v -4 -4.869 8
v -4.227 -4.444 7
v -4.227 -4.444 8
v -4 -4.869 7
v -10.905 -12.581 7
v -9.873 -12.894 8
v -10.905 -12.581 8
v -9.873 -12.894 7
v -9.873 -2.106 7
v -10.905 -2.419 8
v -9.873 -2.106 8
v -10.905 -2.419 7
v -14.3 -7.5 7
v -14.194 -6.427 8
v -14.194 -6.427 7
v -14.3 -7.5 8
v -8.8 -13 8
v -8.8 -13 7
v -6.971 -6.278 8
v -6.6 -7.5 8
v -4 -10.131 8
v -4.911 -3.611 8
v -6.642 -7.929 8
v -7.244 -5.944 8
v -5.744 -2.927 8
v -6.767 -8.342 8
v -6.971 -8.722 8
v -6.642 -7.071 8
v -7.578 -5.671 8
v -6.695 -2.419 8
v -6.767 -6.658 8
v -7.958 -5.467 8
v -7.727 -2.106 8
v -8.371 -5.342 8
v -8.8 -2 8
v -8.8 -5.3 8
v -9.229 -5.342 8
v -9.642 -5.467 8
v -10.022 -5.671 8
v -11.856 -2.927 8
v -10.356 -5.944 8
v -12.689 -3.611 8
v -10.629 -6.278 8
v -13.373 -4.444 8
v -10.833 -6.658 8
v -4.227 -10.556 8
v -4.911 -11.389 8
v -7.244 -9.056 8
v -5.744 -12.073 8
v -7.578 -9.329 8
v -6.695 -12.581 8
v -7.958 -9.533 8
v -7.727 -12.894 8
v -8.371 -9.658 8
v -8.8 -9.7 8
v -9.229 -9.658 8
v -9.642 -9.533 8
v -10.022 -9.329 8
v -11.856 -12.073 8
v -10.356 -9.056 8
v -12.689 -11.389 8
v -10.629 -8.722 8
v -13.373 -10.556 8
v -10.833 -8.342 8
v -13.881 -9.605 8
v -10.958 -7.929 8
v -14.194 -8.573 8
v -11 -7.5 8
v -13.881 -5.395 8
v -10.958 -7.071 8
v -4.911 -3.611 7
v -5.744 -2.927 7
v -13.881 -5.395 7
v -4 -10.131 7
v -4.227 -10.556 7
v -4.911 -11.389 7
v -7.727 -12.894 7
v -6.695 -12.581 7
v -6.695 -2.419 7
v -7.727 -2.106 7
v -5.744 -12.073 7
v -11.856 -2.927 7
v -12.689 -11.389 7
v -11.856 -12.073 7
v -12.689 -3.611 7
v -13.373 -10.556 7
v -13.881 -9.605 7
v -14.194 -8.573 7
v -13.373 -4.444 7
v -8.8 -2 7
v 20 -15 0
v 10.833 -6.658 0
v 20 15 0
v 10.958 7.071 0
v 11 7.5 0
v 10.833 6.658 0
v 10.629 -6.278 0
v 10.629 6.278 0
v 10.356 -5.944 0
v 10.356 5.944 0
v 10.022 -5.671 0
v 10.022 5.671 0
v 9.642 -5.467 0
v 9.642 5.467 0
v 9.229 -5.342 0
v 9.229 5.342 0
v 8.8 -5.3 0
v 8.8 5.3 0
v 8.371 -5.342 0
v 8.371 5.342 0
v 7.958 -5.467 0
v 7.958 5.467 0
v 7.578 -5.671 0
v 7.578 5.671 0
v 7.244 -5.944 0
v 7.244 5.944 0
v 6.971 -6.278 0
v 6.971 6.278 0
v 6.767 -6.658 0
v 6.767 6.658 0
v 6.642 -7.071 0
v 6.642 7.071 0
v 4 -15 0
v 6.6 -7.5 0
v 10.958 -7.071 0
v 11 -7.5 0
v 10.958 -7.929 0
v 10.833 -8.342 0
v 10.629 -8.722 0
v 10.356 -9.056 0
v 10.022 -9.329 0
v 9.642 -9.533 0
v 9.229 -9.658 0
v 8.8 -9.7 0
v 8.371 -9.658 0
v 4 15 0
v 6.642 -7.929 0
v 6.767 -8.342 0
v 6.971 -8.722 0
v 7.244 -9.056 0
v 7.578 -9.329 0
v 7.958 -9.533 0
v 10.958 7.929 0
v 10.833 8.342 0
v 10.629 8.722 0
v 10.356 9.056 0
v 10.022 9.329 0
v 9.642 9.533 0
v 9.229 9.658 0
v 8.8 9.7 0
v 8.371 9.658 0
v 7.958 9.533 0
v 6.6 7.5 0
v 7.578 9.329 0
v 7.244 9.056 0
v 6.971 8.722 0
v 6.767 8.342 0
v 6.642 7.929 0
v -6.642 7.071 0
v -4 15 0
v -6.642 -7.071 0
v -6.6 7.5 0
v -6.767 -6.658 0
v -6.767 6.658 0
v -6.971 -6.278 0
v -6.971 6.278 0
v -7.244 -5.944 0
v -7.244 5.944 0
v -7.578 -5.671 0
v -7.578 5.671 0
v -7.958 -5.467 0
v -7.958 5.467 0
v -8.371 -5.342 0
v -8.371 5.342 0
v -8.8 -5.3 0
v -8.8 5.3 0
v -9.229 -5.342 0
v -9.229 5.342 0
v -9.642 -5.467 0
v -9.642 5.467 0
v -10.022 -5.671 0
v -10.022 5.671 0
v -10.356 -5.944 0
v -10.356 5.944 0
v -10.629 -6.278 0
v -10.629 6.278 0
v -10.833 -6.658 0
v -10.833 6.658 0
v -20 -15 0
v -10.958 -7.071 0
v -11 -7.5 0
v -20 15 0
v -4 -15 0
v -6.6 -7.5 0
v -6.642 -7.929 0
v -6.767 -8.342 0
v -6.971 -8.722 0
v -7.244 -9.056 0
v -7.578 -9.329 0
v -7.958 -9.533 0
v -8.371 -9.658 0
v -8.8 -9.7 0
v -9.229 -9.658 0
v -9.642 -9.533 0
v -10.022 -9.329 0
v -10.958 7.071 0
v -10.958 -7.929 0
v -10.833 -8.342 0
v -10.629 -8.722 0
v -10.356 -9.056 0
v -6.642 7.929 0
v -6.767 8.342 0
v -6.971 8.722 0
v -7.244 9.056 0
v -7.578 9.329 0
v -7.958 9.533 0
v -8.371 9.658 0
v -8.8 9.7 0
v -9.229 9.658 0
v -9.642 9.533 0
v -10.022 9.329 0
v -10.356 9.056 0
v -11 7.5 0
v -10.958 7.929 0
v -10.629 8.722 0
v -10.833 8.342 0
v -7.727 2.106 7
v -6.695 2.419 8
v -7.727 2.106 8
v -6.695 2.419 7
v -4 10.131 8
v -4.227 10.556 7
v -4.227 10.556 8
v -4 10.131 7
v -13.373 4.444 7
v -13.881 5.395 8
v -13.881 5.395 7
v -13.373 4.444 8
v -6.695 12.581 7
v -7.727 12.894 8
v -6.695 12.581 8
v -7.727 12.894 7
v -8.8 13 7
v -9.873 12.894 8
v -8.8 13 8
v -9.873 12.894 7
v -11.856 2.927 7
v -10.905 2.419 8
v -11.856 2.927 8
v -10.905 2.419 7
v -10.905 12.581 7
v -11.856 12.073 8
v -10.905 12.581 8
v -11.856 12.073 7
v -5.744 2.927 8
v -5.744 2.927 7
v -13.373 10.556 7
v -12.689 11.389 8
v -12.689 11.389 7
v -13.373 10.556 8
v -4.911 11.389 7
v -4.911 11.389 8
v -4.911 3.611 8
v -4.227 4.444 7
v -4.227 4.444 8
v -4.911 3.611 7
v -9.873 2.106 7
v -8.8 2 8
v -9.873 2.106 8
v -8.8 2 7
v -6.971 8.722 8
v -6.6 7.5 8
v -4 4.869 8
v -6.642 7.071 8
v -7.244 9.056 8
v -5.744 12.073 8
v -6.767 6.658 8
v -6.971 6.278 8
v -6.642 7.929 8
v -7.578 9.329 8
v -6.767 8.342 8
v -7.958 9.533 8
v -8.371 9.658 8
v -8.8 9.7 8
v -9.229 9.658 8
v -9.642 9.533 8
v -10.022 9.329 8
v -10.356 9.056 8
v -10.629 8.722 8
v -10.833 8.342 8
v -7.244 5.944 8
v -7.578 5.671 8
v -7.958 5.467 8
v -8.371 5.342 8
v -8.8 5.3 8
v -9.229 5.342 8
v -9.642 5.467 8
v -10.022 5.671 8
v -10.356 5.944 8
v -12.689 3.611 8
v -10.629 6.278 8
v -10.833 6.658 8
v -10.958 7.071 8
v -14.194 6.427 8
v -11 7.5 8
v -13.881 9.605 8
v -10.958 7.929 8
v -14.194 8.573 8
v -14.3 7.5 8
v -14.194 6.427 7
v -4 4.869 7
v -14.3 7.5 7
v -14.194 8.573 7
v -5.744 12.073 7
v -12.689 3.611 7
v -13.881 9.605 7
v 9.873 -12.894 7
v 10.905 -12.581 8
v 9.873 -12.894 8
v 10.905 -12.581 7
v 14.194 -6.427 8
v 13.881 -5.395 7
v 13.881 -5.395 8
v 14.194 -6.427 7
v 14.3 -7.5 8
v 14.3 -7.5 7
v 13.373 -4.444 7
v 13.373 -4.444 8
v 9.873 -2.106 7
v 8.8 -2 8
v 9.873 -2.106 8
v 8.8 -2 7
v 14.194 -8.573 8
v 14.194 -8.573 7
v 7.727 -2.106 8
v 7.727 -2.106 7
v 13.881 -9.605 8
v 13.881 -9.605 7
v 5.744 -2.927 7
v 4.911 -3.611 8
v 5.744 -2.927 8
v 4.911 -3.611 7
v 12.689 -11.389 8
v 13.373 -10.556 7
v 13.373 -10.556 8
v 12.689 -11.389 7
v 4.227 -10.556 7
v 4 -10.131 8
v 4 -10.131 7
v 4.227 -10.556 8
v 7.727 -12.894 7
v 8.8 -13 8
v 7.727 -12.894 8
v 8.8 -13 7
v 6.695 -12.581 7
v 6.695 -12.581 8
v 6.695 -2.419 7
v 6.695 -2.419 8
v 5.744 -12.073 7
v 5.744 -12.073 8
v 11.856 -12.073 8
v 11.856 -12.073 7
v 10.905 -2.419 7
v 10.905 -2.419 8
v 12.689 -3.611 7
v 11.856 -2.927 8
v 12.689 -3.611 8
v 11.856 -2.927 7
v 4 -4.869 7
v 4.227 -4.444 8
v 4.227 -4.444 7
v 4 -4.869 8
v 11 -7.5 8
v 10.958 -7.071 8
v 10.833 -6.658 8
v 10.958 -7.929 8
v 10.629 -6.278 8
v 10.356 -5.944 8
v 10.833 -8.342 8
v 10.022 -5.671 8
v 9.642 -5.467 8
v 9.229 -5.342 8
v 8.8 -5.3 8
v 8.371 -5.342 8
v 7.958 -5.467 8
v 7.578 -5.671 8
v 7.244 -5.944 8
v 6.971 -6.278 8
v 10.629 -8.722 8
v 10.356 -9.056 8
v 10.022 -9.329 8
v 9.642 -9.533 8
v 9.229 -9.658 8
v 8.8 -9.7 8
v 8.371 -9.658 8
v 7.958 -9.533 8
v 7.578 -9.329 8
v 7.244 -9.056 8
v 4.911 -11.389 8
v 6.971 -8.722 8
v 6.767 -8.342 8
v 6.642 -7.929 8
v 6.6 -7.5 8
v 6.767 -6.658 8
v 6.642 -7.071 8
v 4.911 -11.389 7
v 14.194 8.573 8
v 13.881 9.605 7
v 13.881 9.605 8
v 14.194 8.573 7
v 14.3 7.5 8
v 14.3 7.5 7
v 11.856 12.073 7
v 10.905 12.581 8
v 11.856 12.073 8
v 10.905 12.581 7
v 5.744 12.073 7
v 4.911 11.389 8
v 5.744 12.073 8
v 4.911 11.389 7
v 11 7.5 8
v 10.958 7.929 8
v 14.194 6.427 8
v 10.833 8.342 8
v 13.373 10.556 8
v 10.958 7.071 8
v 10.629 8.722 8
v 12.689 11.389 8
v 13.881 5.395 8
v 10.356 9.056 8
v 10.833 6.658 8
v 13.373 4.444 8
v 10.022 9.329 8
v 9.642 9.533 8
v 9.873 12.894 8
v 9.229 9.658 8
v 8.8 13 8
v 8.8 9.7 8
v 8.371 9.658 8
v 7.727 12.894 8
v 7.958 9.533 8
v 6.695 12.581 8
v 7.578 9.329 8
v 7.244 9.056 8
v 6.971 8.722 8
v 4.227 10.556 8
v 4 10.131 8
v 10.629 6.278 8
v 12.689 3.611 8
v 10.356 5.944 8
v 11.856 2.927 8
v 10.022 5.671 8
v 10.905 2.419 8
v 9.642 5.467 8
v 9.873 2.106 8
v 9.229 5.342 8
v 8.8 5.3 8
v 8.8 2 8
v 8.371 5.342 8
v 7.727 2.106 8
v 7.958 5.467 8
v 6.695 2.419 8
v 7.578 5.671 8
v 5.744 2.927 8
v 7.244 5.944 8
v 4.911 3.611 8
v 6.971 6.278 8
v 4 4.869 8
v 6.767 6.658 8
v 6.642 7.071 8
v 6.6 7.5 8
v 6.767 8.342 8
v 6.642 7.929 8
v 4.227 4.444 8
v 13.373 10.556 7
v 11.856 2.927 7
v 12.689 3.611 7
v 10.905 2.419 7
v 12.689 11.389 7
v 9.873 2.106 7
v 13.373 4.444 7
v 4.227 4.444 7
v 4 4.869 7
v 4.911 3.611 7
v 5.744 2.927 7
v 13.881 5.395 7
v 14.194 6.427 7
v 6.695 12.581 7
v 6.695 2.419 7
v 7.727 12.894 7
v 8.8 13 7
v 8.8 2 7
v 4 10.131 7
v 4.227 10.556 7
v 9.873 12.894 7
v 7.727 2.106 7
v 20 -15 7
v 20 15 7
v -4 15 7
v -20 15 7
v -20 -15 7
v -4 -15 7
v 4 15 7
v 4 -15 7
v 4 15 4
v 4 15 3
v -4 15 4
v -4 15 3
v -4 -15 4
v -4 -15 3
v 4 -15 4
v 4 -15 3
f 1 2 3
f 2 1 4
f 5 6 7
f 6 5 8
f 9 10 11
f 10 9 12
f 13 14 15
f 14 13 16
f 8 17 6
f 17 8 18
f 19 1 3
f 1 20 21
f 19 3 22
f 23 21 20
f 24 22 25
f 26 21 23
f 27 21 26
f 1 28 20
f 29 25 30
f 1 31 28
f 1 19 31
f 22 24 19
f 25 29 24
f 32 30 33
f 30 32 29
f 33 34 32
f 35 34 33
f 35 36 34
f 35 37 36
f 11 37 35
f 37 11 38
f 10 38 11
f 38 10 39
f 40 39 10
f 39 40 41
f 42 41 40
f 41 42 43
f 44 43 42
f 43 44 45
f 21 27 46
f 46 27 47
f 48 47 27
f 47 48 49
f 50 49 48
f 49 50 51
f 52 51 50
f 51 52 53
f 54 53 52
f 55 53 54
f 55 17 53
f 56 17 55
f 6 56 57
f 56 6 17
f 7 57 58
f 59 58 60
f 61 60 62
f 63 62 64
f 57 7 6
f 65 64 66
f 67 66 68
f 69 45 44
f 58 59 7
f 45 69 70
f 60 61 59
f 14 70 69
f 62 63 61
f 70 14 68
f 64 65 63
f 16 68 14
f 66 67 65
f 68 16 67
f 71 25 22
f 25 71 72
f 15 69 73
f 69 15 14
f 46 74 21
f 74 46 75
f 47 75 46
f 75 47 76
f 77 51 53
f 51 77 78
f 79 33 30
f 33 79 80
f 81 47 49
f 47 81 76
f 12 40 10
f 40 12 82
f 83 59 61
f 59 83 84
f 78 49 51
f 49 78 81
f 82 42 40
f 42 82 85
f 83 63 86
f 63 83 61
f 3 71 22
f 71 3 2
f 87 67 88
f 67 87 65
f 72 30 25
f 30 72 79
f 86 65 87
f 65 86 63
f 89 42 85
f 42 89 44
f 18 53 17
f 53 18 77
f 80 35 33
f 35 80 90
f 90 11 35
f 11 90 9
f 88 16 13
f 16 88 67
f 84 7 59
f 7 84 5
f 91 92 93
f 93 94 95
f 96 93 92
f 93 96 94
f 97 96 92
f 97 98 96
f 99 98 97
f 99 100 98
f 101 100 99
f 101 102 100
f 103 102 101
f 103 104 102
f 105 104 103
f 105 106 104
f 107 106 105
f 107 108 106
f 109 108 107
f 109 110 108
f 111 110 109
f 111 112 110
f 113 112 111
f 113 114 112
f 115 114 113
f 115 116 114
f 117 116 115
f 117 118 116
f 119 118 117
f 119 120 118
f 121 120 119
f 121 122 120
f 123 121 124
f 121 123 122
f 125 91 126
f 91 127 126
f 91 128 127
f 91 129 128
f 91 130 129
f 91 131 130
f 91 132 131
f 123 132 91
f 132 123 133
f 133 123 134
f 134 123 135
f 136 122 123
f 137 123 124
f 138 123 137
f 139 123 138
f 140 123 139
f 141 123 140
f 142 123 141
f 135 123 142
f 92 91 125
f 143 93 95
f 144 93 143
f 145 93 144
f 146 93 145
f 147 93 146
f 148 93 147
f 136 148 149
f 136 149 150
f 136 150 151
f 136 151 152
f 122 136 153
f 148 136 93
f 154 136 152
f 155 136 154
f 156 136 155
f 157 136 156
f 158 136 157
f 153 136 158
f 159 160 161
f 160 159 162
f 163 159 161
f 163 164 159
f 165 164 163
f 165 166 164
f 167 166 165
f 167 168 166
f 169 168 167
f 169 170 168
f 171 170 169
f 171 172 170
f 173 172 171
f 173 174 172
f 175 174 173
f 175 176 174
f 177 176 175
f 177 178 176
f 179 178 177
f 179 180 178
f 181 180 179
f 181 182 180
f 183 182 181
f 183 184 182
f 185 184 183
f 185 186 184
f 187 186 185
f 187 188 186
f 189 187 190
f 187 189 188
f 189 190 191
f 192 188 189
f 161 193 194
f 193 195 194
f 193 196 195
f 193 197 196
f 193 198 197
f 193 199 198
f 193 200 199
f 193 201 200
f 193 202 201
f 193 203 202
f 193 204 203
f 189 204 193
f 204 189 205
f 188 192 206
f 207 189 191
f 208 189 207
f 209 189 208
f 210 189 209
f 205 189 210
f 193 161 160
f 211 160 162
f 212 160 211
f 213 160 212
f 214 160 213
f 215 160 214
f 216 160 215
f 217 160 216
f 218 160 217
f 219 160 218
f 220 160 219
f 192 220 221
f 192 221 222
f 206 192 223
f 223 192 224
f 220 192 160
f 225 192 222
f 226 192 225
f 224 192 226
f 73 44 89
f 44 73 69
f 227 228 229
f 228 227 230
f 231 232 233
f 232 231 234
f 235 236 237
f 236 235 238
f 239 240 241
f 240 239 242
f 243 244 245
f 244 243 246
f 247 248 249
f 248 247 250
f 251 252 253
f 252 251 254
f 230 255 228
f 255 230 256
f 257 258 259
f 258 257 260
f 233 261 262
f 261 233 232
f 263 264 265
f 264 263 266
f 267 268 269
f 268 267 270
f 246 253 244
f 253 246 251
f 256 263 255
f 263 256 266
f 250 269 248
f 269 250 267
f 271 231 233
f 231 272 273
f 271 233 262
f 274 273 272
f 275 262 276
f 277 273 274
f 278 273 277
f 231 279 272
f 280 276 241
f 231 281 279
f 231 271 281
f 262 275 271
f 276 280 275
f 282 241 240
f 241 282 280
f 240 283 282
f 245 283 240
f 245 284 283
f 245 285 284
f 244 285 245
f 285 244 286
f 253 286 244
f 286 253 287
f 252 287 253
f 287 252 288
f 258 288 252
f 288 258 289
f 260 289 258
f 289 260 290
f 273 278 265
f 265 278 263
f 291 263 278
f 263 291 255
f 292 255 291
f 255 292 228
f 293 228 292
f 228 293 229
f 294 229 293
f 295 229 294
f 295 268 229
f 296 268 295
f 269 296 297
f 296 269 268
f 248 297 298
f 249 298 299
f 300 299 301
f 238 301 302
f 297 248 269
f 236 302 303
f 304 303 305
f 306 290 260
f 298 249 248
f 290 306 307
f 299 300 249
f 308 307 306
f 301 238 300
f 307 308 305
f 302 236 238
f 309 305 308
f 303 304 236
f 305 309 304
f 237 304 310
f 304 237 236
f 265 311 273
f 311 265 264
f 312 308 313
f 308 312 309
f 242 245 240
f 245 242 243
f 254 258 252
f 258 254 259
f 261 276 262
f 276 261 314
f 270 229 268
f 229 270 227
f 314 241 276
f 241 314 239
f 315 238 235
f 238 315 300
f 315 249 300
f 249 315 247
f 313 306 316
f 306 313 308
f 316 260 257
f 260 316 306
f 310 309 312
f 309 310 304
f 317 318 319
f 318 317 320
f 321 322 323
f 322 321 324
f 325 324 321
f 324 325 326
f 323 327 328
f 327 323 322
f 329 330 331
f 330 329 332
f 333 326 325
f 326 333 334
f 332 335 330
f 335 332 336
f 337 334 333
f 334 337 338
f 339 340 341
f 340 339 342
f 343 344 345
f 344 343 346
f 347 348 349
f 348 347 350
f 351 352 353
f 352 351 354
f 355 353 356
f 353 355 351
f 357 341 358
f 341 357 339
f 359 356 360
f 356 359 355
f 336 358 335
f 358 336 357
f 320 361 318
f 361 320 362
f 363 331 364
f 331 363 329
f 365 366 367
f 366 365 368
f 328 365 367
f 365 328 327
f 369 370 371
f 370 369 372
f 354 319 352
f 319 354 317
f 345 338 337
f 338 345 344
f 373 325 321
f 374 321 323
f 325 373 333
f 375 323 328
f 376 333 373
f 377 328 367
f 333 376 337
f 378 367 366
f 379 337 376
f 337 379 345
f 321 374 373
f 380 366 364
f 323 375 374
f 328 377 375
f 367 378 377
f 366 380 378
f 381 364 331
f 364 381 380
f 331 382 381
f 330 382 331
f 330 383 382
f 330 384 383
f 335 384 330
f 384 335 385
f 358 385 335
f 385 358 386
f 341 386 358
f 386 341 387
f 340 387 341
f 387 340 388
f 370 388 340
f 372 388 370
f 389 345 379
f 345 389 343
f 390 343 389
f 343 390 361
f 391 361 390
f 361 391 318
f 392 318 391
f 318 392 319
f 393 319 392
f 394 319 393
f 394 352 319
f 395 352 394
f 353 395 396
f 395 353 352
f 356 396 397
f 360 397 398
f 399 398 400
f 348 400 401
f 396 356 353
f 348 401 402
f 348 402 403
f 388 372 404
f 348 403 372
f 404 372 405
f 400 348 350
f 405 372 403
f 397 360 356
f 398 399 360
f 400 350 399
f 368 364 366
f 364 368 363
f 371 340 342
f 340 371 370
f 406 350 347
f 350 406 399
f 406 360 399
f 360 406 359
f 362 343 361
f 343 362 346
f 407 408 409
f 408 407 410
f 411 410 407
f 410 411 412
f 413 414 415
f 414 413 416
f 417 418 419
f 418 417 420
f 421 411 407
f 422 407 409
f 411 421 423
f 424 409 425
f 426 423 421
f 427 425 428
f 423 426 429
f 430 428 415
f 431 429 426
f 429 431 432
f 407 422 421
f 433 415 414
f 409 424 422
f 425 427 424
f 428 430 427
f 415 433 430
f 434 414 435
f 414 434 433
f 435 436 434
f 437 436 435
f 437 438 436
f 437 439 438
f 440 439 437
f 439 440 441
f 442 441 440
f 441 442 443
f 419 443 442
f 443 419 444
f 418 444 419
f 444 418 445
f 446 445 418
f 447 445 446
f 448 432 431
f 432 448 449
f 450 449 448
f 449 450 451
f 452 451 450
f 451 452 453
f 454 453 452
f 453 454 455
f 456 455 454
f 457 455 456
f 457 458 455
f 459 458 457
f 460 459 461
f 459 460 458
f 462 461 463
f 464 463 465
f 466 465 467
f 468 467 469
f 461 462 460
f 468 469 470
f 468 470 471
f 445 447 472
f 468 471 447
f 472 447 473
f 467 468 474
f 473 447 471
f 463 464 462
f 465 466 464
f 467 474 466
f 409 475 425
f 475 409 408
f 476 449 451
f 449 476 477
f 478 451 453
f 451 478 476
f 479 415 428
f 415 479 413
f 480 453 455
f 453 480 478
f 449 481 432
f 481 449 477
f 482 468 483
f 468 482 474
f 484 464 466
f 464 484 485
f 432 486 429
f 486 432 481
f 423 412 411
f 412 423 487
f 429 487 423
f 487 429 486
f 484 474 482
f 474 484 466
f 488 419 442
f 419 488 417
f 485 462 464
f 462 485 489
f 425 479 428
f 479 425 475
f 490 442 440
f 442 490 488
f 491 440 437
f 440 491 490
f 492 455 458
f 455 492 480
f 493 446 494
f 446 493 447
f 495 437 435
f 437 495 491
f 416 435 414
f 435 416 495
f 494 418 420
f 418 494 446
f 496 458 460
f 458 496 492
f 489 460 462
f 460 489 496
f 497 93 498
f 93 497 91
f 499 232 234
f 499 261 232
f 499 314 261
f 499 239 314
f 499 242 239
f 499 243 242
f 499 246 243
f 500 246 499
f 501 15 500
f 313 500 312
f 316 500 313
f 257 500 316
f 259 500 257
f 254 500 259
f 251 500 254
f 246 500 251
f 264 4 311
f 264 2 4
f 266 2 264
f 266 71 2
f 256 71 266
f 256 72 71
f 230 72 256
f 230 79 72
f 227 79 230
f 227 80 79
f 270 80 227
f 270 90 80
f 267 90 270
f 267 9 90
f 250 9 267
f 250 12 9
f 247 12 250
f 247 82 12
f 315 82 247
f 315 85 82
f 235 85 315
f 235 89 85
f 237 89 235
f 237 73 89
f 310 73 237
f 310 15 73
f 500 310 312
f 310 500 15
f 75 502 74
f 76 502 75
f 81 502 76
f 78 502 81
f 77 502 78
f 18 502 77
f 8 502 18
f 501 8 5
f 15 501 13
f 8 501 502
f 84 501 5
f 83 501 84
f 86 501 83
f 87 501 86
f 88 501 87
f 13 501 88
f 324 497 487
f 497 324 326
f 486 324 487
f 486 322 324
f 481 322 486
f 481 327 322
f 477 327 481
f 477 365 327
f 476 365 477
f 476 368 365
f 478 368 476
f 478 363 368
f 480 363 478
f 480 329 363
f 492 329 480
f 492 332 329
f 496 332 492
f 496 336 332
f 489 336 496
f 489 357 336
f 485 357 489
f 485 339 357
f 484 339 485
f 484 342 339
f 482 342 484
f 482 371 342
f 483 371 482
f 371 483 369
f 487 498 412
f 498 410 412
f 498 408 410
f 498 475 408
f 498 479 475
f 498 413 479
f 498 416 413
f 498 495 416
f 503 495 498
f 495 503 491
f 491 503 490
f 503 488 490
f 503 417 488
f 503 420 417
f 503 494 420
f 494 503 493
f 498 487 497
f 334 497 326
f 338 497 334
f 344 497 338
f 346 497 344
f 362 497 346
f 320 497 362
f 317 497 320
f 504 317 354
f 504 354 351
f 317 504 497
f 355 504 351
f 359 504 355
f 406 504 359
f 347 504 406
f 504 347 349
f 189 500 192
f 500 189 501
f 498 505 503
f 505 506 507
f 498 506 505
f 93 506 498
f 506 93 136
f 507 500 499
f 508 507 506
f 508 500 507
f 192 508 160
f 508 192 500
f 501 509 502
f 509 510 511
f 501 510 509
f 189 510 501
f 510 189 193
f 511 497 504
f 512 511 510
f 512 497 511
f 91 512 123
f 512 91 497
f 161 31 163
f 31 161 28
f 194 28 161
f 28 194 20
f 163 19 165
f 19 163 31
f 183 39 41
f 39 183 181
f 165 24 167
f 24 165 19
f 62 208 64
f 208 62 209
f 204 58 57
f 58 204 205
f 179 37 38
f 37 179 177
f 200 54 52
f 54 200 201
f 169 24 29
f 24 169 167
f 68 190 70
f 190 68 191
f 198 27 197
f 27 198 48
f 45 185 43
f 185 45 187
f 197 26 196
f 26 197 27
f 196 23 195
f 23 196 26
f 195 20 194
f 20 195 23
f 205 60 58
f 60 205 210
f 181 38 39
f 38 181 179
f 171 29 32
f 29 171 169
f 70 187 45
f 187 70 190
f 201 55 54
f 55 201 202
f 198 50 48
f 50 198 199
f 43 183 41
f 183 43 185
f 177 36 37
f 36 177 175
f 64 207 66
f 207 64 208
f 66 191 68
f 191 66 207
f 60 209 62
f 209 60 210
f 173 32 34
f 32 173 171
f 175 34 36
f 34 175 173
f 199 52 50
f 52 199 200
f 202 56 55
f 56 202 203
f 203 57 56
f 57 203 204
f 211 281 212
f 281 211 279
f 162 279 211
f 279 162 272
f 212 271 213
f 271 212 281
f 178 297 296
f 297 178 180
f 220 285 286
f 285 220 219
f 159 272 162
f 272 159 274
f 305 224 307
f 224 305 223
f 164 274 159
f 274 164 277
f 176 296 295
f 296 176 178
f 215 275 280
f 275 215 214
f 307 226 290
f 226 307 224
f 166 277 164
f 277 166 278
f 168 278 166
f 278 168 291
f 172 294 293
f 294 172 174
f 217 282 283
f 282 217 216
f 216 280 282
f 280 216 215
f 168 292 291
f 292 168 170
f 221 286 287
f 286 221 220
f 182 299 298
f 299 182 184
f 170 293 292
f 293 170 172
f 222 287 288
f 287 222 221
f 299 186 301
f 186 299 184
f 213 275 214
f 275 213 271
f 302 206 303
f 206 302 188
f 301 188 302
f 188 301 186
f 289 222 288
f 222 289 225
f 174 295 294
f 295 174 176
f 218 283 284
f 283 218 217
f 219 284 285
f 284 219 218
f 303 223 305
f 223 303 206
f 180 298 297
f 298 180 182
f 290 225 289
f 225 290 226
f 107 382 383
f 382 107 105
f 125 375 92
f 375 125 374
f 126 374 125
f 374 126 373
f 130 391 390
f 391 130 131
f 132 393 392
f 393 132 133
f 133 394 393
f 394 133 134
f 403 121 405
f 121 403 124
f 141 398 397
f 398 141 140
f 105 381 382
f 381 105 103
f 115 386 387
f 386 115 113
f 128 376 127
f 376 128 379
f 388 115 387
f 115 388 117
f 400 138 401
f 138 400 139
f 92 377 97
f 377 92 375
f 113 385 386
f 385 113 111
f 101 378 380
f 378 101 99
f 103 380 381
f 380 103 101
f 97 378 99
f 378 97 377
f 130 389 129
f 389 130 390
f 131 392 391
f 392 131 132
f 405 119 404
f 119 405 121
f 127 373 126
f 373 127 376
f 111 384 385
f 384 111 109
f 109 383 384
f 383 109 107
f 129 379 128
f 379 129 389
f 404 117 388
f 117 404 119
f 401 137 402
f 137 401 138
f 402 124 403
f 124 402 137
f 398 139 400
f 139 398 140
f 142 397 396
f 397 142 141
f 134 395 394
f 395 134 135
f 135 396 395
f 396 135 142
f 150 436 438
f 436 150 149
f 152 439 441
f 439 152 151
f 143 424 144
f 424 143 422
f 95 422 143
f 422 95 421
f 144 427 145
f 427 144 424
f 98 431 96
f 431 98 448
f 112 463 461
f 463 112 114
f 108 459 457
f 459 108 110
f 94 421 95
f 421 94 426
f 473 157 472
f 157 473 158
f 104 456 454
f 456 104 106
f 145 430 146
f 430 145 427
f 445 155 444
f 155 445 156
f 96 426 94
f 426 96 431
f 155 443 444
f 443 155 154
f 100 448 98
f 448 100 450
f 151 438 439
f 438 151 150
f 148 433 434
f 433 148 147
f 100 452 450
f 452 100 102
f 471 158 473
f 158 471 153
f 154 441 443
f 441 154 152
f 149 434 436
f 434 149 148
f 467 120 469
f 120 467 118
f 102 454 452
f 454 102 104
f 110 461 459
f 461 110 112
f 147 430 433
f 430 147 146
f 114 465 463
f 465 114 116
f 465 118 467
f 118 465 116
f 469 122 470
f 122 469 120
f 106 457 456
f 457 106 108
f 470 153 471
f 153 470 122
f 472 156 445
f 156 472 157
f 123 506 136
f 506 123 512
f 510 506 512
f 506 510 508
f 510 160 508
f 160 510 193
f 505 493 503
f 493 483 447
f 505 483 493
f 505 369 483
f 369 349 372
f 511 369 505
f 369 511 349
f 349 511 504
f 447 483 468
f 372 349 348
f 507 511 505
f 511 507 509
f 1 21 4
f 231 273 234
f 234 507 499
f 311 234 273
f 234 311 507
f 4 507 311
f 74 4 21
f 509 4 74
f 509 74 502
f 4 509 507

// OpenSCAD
$fn = 32;

// ----------------------------------------------------------------------
// Living hinge: 40 x 30 mm plates, 1 mm flexible web
// ----------------------------------------------------------------------

// --- parameters (mm) ---
plate_len = 16;           // plate length outside the web
plate_w = 30;             // plate width
thick = 7;                // plate thickness
web_half = 4;             // half width of the flex band
web_t = 1;                // flexible web thickness
web_z = 3;                // web position inside the thickness
boss_d = 11;              // screw boss diameter
boss_h = 8;               // screw boss height
boss_x = 8.8;             // screw boss distance from the web
screw_d = 4.4;            // screw hole

difference() {
  union() {
    /* one flat strip, later thinned at the middle */
    translate([-20, -15, 0]) cube([40, 30, 7]);
    /* screw bosses, sunk 0.5 mm into the plates */
    for (sx = [-8.8, 8.8]) {
      for (sy = [-7.5, 7.5]) {
        translate([sx, sy, 0]) cylinder(h = boss_h, d = boss_d);
      }
    }
  }
  /* channel from below: leaves the web on top of it */
  translate([-4, -17.5, -2.5]) cube([8, 35, 5.5]);
  /* channel from above: thins the web down to web_t */
  translate([-4, -17.5, 4]) cube([8, 35, 5.5]);
  /* screw holes through the bosses */
  for (sx = [-8.8, 8.8]) {
    for (sy = [-7.5, 7.5]) {
      translate([sx, sy, -2.5]) cylinder(h = boss_h + 5, d = screw_d);
    }
  }
}
